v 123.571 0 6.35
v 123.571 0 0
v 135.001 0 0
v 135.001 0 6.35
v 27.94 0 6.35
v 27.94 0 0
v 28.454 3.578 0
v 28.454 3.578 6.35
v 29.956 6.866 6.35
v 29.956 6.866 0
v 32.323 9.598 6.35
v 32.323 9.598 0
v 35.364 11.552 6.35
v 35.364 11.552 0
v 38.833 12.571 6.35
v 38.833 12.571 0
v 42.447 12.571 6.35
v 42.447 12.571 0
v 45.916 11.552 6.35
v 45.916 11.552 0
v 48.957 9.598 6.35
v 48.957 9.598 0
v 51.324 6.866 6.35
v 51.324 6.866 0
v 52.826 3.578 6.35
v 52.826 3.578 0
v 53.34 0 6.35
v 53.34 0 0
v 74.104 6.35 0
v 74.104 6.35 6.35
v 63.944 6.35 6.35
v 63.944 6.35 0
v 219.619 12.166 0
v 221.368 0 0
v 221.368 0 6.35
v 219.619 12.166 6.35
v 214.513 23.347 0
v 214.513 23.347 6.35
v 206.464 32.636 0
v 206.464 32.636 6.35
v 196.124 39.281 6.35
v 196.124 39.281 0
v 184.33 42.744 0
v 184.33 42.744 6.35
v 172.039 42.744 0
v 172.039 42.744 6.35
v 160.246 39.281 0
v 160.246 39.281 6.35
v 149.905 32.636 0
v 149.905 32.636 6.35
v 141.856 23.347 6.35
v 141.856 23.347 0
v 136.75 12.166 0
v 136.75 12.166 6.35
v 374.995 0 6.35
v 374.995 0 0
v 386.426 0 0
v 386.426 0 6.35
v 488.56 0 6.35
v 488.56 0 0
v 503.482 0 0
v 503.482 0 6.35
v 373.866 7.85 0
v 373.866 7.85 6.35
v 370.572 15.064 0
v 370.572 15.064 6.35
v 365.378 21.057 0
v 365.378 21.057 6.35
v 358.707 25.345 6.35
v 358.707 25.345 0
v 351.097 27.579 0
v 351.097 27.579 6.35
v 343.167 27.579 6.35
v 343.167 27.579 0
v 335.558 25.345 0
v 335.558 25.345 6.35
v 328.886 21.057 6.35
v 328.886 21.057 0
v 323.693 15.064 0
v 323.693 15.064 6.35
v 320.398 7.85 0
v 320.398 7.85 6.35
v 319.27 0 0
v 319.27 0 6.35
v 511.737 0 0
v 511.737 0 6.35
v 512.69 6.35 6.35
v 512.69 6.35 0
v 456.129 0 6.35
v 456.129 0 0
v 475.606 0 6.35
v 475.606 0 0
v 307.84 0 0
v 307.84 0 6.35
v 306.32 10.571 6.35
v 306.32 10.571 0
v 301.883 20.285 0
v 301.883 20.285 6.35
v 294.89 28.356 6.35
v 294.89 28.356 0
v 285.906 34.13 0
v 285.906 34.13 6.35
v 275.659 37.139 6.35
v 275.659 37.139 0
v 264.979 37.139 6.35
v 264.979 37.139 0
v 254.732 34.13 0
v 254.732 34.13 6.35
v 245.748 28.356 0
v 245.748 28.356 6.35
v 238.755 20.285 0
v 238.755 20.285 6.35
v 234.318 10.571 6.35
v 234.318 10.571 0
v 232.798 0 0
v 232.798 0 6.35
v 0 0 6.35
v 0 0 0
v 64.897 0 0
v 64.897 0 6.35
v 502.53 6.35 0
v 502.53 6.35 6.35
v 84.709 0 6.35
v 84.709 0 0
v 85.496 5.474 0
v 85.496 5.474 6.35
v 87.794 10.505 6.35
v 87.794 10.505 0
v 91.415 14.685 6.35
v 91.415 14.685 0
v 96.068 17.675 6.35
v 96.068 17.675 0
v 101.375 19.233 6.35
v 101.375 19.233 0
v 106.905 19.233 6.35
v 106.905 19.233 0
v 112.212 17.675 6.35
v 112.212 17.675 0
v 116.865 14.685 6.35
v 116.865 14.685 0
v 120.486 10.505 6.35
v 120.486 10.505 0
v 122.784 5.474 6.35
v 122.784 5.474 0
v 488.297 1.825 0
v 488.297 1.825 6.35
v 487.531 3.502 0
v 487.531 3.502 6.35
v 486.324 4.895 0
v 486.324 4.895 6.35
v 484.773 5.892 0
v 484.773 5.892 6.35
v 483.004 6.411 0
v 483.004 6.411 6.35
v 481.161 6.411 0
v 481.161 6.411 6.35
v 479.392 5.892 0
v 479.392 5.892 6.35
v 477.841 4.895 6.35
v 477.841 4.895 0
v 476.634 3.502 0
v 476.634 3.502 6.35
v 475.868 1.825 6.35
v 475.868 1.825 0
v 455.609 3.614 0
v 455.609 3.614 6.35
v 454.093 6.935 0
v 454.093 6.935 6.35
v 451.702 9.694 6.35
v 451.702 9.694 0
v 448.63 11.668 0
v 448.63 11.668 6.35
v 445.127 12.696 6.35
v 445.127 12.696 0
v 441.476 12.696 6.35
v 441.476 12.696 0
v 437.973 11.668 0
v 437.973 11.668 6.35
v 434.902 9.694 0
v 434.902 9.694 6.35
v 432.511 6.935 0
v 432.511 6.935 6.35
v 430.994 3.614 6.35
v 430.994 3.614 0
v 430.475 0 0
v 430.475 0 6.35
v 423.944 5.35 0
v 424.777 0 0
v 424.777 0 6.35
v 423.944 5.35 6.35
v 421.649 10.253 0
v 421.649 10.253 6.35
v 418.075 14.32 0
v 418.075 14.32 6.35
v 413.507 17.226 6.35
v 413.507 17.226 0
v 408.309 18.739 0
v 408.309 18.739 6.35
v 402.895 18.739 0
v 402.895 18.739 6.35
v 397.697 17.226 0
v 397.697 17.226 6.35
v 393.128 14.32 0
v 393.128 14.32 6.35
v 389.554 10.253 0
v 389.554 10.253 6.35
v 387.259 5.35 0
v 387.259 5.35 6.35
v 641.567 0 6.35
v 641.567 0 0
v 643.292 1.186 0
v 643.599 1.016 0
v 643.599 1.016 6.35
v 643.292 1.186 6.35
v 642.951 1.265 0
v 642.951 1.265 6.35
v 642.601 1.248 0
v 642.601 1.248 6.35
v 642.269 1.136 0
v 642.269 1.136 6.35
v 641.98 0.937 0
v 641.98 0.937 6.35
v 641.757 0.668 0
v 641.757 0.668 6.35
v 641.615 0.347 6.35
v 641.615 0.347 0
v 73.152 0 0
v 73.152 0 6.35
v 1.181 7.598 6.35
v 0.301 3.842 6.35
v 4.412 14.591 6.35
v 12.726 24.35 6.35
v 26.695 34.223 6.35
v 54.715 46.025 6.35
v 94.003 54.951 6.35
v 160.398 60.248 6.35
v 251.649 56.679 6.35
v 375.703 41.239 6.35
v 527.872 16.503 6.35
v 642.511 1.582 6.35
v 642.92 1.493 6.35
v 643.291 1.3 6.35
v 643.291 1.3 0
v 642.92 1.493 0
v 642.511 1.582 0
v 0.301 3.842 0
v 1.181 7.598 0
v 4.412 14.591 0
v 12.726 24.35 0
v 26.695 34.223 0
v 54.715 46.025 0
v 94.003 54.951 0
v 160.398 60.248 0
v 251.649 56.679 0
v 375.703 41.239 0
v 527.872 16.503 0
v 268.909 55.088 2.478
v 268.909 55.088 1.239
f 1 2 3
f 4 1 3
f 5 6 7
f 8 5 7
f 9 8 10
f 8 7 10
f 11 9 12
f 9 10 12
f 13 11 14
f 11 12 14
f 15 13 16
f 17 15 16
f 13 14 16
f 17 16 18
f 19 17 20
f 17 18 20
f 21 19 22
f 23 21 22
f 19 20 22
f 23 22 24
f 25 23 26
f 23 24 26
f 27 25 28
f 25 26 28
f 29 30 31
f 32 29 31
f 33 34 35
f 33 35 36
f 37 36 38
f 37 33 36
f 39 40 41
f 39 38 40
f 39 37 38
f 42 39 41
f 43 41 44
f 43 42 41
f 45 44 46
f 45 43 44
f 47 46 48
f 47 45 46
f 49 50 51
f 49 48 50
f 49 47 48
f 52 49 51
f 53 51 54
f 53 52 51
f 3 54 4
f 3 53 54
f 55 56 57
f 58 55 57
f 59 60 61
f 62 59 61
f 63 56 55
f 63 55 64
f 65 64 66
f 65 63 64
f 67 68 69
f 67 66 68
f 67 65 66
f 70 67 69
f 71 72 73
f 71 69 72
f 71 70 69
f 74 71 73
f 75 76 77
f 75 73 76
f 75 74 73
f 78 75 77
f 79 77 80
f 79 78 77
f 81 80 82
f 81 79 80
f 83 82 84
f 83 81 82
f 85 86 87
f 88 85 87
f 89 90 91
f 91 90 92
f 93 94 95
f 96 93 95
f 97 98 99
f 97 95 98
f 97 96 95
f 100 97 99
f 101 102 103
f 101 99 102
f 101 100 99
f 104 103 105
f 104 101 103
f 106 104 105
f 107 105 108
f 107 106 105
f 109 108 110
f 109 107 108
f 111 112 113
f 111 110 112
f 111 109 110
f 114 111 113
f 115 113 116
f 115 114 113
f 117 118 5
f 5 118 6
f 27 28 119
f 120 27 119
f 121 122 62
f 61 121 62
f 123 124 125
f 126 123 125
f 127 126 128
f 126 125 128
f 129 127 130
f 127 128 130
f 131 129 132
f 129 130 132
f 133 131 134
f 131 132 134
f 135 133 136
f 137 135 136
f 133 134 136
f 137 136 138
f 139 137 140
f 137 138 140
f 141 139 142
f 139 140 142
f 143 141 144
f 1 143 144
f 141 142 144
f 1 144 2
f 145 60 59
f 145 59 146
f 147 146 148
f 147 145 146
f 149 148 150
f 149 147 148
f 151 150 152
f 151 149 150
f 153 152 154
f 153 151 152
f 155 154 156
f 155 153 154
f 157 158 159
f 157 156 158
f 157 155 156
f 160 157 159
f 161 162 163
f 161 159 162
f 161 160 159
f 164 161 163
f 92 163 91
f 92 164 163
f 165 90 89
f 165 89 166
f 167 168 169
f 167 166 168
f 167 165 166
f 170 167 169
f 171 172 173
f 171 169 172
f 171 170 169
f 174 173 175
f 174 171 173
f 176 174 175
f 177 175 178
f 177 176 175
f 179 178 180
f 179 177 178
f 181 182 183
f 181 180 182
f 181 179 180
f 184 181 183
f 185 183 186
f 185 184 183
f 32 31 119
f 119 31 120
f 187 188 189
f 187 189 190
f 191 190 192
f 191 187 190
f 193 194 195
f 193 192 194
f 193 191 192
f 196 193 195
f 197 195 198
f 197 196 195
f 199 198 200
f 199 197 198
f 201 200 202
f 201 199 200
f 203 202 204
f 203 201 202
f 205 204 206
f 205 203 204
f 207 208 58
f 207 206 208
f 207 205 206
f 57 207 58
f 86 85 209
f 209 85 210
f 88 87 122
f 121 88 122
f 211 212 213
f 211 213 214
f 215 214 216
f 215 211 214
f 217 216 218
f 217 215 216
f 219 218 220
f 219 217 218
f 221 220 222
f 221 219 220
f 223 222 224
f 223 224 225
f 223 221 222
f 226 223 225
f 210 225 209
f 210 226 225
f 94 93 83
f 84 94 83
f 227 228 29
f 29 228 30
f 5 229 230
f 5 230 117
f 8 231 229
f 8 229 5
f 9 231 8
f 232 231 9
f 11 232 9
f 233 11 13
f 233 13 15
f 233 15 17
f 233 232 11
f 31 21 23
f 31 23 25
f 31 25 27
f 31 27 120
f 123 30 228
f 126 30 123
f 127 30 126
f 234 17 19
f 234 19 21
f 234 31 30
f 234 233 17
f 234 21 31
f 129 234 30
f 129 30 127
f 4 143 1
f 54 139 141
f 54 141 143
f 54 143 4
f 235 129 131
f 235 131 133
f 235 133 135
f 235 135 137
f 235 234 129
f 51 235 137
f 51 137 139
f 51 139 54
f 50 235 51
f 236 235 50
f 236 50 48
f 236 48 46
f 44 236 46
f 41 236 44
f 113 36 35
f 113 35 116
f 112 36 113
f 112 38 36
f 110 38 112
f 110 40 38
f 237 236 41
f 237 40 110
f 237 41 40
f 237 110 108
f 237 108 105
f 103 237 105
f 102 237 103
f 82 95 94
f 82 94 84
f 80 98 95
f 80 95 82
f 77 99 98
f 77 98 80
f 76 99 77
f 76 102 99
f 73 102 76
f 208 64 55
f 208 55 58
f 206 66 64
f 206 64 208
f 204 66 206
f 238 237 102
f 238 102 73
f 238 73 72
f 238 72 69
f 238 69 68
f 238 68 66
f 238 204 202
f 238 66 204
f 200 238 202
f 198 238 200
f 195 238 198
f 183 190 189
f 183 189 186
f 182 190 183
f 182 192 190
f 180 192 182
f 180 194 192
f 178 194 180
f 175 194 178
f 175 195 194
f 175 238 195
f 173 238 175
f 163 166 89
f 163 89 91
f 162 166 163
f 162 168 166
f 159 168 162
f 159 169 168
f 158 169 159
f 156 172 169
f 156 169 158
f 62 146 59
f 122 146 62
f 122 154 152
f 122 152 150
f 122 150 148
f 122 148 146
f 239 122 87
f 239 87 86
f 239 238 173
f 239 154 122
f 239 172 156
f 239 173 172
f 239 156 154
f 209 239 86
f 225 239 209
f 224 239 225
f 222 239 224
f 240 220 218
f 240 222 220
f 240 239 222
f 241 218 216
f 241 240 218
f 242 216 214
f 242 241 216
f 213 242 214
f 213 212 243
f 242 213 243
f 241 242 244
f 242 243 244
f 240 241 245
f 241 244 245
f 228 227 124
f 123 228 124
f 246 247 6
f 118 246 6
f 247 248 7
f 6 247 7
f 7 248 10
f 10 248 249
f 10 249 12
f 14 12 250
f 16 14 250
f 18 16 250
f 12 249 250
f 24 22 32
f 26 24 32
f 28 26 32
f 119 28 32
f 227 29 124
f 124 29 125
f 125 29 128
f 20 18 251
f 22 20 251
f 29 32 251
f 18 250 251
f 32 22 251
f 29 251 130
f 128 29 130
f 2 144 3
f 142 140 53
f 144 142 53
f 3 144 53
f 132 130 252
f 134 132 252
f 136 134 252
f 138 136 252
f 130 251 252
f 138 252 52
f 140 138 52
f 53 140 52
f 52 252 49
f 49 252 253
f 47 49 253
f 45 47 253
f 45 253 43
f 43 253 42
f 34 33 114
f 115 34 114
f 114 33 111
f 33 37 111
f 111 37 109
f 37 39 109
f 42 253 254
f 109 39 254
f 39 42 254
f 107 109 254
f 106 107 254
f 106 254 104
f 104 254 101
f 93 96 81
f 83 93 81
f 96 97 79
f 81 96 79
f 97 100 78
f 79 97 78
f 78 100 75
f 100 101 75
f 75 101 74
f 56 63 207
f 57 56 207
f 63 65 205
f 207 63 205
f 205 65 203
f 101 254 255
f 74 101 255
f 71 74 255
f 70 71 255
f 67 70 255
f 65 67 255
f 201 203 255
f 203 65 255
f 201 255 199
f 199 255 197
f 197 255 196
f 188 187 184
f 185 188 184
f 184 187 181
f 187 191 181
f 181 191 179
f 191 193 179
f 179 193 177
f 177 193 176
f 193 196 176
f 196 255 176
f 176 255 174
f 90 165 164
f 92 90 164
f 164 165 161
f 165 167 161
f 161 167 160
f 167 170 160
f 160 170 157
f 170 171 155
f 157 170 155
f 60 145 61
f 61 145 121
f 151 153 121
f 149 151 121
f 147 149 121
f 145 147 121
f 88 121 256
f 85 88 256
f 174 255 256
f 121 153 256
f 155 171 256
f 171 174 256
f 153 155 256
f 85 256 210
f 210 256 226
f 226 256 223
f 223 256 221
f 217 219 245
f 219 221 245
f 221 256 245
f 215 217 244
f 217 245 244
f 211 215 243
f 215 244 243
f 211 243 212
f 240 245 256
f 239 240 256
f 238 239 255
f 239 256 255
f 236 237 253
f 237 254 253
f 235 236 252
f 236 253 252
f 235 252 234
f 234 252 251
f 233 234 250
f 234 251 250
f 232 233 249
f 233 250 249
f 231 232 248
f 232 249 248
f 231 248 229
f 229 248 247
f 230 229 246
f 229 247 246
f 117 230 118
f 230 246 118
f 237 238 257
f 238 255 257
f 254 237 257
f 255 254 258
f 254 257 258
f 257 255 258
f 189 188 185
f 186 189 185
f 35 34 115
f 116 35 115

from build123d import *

# Parameters (mm, degrees)
BOSS_EXTRUDE1_DEPTH     = 6.35
CUT_EXTRUDE1_DEPTH      = 647.819942004
CUT_EXTRUDE1_DEPTH_BACK = 647.819942004
SKETCH4_W               = 6.35
SKETCH4_H               = 6.35
CUT_EXTRUDE2_DEPTH      = 6.35
CUT_EXTRUDE3_START      = -6.35
CUT_EXTRUDE3_DEPTH      = 6.35


# Read off the part's stored shape, not the designer's step: Cut-Extrude3
with BuildPart() as part:
    # Sketch2 → Boss-Extrude1 (new body)
    with BuildSketch(Plane.XY):
        with BuildLine():
            ThreePointArc((84.709, 0), (104.14, 19.431), (123.571, 0))
            Line((123.571, 0), (460.660965279, 0))
            Line((460.660965279, 0), (473.360965279, 0))
            Line((473.360965279, 0), (643.966787522, 0))
            ThreePointArc((643.966787522, 0), (643.547407924, 1.075012082), (642.510849283, 1.582039112))
            add(Edge.make_bspline(
                [(642.510849283, 1.582039112), (641.993392355, 1.625070631), (638.093728429, 1.953546407), (630.413817462, 2.663385493), (619.014124193, 3.849253664), (606.374988512, 5.304428983), (592.543922516, 7.037634907), (577.585454095, 9.050636147), (561.564270734, 11.338919625), (544.549749946, 13.890665375), (526.614143658, 16.687720753), (507.832591566, 19.705111663), (488.282710288, 22.911672601), (468.044367735, 26.27043606), (447.199424328, 29.739007432), (425.831595832, 33.270324121), (404.02631566, 36.813220545), (381.870662856, 40.313266856), (359.453314895, 43.713502532), (336.86454415, 46.955447457), (314.196207315, 49.979843895), (291.541767704, 52.727712704), (268.996310773, 55.141201012), (246.65655865, 57.164603829), (224.620860897, 58.745176641), (202.989192599, 59.8341217), (181.863132616, 60.387506142), (161.345829027, 60.366961324), (141.542033828, 59.739895824), (122.558104573, 58.481758104), (104.502313427, 56.574303932), (87.485018636, 54.008935199), (71.619696083, 50.784752003), (57.023709725, 46.912543066), (43.82045433, 42.41500246), (32.141645239, 37.332204029), (22.129107375, 31.731455339), (13.932423524, 25.726412106), (7.689616489, 19.513207632), (3.463136343, 13.420354421), (1.106333228, 7.923389435), (0.154611582, 3.513796615), (0, 1.007496172), (0, 0)],
                knots=[0.020157042, 0.020157042, 0.020157042, 0.020157042, 0.021270888, 0.028552555, 0.036780684, 0.045920102, 0.055931764, 0.066772884, 0.07839713, 0.090754827, 0.103793165, 0.117456432, 0.131686226, 0.146421738, 0.161599998, 0.177156133, 0.193023668, 0.209134786, 0.225420633, 0.241811602, 0.258237647, 0.274628557, 0.290914287, 0.307025229, 0.322892517, 0.338448342, 0.353626207, 0.368361232, 0.382590428, 0.396252961, 0.409290412, 0.42164701, 0.433269881, 0.444109249, 0.45411864, 0.463255055, 0.471479114, 0.478755289, 0.485052318, 0.490344026, 0.494609833, 0.497833231, 0.5, 0.5, 0.5, 0.5], degree=3))
            Line((0, 0), (27.94, 0))
            ThreePointArc((27.94, 0), (40.64, 12.7), (53.34, 0))
            Line((53.34, 0), (84.709, 0))
        make_face()
    extrude(amount=BOSS_EXTRUDE1_DEPTH)

    # Sketch3 → Cut-Extrude1 (cut, two sides: drawn at the far end of the back side and taken through both)
    with BuildSketch(Plane.XY.offset(6.35).offset(-CUT_EXTRUDE1_DEPTH_BACK)):
        with BuildLine():
            Line((135.001, 0), (221.368346157, 0))
            ThreePointArc((221.368346157, 0), (178.184673078, 43.183673078), (135.001, 0))
        make_face()
        with BuildLine():
            ThreePointArc((135.001, 0), (178.184673078, -43.183673078), (221.368346157, 0))
            Line((221.368346157, 0), (135.001, 0))
        make_face()
        with BuildLine():
            ThreePointArc((307.839599131, 0), (270.318972644, 37.520626487), (232.798346157, 0))
            Line((232.798346157, 0), (307.839599131, 0))
        make_face()
        with BuildLine():
            Line((307.839599131, 0), (232.798346157, 0))
            ThreePointArc((232.798346157, 0), (270.318972644, -37.520626487), (307.839599131, 0))
        make_face()
        with BuildLine():
            ThreePointArc((374.99479385, 0), (347.13219649, 27.862597359), (319.269599131, 0))
            Line((319.269599131, 0), (374.99479385, 0))
        make_face()
        with BuildLine():
            Line((374.99479385, 0), (319.269599131, 0))
            ThreePointArc((319.269599131, 0), (347.13219649, -27.862597359), (374.99479385, 0))
        make_face()
        with BuildLine():
            ThreePointArc((424.777212339, 0), (405.60179385, 18.930718125), (386.426375361, 0))
            Line((386.426375361, 0), (424.777212339, 0))
        make_face()
        with BuildLine():
            Line((424.777212339, 0), (386.426375361, 0))
            ThreePointArc((386.426375361, 0), (405.478650373, -19.422886493), (424.77879385, -0.246281875))
            ThreePointArc((424.77879385, -0.246281875), (424.778398468, -0.123138399), (424.777212339, 0))
        make_face()
        with BuildLine():
            ThreePointArc((456.128866123, 0), (443.301866123, 12.827), (430.474866123, 0))
            Line((430.474866123, 0), (456.128866123, 0))
        make_face()
        with BuildLine():
            Line((456.128866123, 0), (430.474866123, 0))
            ThreePointArc((430.474866123, 0), (443.301866123, -12.827), (456.128866123, 0))
        make_face()
        with BuildLine():
            ThreePointArc((488.559534569, 0), (482.082534569, 6.477), (475.605534569, 0))
            Line((475.605534569, 0), (488.559534569, 0))
        make_face()
        with BuildLine():
            Line((488.559534569, 0), (475.605534569, 0))
            ThreePointArc((475.605534569, 0), (482.082534569, -6.477), (488.559534569, 0))
        make_face()
    extrude(amount=CUT_EXTRUDE1_DEPTH + CUT_EXTRUDE1_DEPTH_BACK, mode=Mode.SUBTRACT)

    # Sketch4 → Cut-Extrude2 (cut)
    with BuildSketch(Plane.XY.offset(6.35)):
        Polygon((504.434534569, 0), (504.434534569, 6.35), (502.529534569, 6.35), (503.482034569, 0), align=None)
        with Locations((507.609534569, 3.175)):
            Rectangle(SKETCH4_W, SKETCH4_H)
        Polygon((512.689534569, 6.35), (510.784534569, 6.35), (510.784534569, 0), (511.737034569, 0), align=None)
        Polygon((63.9445, 6.35), (64.897, 0), (65.8495, 0), (65.8495, 6.35), align=None)
        with Locations((69.0245, 3.175)):
            Rectangle(SKETCH4_W, SKETCH4_H)
        Polygon((72.1995, 6.35), (72.1995, 0), (73.152, 0), (74.1045, 6.35), align=None)
    extrude(amount=-CUT_EXTRUDE2_DEPTH, mode=Mode.SUBTRACT)

    # Cut-Extrude3 outline → Cut-Extrude3 (cut)
    with BuildSketch(Plane.XY.offset(6.35).offset(CUT_EXTRUDE3_START)):
        with BuildLine():
            ThreePointArc((643.966787522, 0), (643.872033495, 0.540245973), (643.599082689, 1.016))
            ThreePointArc((643.599082689, 1.016), (642.269121423, 1.135922533), (641.567082689, 0))
            Line((641.567082689, 0), (643.966787522, 0))
        make_face()
    extrude(amount=CUT_EXTRUDE3_DEPTH, mode=Mode.SUBTRACT)


solid = part.part
